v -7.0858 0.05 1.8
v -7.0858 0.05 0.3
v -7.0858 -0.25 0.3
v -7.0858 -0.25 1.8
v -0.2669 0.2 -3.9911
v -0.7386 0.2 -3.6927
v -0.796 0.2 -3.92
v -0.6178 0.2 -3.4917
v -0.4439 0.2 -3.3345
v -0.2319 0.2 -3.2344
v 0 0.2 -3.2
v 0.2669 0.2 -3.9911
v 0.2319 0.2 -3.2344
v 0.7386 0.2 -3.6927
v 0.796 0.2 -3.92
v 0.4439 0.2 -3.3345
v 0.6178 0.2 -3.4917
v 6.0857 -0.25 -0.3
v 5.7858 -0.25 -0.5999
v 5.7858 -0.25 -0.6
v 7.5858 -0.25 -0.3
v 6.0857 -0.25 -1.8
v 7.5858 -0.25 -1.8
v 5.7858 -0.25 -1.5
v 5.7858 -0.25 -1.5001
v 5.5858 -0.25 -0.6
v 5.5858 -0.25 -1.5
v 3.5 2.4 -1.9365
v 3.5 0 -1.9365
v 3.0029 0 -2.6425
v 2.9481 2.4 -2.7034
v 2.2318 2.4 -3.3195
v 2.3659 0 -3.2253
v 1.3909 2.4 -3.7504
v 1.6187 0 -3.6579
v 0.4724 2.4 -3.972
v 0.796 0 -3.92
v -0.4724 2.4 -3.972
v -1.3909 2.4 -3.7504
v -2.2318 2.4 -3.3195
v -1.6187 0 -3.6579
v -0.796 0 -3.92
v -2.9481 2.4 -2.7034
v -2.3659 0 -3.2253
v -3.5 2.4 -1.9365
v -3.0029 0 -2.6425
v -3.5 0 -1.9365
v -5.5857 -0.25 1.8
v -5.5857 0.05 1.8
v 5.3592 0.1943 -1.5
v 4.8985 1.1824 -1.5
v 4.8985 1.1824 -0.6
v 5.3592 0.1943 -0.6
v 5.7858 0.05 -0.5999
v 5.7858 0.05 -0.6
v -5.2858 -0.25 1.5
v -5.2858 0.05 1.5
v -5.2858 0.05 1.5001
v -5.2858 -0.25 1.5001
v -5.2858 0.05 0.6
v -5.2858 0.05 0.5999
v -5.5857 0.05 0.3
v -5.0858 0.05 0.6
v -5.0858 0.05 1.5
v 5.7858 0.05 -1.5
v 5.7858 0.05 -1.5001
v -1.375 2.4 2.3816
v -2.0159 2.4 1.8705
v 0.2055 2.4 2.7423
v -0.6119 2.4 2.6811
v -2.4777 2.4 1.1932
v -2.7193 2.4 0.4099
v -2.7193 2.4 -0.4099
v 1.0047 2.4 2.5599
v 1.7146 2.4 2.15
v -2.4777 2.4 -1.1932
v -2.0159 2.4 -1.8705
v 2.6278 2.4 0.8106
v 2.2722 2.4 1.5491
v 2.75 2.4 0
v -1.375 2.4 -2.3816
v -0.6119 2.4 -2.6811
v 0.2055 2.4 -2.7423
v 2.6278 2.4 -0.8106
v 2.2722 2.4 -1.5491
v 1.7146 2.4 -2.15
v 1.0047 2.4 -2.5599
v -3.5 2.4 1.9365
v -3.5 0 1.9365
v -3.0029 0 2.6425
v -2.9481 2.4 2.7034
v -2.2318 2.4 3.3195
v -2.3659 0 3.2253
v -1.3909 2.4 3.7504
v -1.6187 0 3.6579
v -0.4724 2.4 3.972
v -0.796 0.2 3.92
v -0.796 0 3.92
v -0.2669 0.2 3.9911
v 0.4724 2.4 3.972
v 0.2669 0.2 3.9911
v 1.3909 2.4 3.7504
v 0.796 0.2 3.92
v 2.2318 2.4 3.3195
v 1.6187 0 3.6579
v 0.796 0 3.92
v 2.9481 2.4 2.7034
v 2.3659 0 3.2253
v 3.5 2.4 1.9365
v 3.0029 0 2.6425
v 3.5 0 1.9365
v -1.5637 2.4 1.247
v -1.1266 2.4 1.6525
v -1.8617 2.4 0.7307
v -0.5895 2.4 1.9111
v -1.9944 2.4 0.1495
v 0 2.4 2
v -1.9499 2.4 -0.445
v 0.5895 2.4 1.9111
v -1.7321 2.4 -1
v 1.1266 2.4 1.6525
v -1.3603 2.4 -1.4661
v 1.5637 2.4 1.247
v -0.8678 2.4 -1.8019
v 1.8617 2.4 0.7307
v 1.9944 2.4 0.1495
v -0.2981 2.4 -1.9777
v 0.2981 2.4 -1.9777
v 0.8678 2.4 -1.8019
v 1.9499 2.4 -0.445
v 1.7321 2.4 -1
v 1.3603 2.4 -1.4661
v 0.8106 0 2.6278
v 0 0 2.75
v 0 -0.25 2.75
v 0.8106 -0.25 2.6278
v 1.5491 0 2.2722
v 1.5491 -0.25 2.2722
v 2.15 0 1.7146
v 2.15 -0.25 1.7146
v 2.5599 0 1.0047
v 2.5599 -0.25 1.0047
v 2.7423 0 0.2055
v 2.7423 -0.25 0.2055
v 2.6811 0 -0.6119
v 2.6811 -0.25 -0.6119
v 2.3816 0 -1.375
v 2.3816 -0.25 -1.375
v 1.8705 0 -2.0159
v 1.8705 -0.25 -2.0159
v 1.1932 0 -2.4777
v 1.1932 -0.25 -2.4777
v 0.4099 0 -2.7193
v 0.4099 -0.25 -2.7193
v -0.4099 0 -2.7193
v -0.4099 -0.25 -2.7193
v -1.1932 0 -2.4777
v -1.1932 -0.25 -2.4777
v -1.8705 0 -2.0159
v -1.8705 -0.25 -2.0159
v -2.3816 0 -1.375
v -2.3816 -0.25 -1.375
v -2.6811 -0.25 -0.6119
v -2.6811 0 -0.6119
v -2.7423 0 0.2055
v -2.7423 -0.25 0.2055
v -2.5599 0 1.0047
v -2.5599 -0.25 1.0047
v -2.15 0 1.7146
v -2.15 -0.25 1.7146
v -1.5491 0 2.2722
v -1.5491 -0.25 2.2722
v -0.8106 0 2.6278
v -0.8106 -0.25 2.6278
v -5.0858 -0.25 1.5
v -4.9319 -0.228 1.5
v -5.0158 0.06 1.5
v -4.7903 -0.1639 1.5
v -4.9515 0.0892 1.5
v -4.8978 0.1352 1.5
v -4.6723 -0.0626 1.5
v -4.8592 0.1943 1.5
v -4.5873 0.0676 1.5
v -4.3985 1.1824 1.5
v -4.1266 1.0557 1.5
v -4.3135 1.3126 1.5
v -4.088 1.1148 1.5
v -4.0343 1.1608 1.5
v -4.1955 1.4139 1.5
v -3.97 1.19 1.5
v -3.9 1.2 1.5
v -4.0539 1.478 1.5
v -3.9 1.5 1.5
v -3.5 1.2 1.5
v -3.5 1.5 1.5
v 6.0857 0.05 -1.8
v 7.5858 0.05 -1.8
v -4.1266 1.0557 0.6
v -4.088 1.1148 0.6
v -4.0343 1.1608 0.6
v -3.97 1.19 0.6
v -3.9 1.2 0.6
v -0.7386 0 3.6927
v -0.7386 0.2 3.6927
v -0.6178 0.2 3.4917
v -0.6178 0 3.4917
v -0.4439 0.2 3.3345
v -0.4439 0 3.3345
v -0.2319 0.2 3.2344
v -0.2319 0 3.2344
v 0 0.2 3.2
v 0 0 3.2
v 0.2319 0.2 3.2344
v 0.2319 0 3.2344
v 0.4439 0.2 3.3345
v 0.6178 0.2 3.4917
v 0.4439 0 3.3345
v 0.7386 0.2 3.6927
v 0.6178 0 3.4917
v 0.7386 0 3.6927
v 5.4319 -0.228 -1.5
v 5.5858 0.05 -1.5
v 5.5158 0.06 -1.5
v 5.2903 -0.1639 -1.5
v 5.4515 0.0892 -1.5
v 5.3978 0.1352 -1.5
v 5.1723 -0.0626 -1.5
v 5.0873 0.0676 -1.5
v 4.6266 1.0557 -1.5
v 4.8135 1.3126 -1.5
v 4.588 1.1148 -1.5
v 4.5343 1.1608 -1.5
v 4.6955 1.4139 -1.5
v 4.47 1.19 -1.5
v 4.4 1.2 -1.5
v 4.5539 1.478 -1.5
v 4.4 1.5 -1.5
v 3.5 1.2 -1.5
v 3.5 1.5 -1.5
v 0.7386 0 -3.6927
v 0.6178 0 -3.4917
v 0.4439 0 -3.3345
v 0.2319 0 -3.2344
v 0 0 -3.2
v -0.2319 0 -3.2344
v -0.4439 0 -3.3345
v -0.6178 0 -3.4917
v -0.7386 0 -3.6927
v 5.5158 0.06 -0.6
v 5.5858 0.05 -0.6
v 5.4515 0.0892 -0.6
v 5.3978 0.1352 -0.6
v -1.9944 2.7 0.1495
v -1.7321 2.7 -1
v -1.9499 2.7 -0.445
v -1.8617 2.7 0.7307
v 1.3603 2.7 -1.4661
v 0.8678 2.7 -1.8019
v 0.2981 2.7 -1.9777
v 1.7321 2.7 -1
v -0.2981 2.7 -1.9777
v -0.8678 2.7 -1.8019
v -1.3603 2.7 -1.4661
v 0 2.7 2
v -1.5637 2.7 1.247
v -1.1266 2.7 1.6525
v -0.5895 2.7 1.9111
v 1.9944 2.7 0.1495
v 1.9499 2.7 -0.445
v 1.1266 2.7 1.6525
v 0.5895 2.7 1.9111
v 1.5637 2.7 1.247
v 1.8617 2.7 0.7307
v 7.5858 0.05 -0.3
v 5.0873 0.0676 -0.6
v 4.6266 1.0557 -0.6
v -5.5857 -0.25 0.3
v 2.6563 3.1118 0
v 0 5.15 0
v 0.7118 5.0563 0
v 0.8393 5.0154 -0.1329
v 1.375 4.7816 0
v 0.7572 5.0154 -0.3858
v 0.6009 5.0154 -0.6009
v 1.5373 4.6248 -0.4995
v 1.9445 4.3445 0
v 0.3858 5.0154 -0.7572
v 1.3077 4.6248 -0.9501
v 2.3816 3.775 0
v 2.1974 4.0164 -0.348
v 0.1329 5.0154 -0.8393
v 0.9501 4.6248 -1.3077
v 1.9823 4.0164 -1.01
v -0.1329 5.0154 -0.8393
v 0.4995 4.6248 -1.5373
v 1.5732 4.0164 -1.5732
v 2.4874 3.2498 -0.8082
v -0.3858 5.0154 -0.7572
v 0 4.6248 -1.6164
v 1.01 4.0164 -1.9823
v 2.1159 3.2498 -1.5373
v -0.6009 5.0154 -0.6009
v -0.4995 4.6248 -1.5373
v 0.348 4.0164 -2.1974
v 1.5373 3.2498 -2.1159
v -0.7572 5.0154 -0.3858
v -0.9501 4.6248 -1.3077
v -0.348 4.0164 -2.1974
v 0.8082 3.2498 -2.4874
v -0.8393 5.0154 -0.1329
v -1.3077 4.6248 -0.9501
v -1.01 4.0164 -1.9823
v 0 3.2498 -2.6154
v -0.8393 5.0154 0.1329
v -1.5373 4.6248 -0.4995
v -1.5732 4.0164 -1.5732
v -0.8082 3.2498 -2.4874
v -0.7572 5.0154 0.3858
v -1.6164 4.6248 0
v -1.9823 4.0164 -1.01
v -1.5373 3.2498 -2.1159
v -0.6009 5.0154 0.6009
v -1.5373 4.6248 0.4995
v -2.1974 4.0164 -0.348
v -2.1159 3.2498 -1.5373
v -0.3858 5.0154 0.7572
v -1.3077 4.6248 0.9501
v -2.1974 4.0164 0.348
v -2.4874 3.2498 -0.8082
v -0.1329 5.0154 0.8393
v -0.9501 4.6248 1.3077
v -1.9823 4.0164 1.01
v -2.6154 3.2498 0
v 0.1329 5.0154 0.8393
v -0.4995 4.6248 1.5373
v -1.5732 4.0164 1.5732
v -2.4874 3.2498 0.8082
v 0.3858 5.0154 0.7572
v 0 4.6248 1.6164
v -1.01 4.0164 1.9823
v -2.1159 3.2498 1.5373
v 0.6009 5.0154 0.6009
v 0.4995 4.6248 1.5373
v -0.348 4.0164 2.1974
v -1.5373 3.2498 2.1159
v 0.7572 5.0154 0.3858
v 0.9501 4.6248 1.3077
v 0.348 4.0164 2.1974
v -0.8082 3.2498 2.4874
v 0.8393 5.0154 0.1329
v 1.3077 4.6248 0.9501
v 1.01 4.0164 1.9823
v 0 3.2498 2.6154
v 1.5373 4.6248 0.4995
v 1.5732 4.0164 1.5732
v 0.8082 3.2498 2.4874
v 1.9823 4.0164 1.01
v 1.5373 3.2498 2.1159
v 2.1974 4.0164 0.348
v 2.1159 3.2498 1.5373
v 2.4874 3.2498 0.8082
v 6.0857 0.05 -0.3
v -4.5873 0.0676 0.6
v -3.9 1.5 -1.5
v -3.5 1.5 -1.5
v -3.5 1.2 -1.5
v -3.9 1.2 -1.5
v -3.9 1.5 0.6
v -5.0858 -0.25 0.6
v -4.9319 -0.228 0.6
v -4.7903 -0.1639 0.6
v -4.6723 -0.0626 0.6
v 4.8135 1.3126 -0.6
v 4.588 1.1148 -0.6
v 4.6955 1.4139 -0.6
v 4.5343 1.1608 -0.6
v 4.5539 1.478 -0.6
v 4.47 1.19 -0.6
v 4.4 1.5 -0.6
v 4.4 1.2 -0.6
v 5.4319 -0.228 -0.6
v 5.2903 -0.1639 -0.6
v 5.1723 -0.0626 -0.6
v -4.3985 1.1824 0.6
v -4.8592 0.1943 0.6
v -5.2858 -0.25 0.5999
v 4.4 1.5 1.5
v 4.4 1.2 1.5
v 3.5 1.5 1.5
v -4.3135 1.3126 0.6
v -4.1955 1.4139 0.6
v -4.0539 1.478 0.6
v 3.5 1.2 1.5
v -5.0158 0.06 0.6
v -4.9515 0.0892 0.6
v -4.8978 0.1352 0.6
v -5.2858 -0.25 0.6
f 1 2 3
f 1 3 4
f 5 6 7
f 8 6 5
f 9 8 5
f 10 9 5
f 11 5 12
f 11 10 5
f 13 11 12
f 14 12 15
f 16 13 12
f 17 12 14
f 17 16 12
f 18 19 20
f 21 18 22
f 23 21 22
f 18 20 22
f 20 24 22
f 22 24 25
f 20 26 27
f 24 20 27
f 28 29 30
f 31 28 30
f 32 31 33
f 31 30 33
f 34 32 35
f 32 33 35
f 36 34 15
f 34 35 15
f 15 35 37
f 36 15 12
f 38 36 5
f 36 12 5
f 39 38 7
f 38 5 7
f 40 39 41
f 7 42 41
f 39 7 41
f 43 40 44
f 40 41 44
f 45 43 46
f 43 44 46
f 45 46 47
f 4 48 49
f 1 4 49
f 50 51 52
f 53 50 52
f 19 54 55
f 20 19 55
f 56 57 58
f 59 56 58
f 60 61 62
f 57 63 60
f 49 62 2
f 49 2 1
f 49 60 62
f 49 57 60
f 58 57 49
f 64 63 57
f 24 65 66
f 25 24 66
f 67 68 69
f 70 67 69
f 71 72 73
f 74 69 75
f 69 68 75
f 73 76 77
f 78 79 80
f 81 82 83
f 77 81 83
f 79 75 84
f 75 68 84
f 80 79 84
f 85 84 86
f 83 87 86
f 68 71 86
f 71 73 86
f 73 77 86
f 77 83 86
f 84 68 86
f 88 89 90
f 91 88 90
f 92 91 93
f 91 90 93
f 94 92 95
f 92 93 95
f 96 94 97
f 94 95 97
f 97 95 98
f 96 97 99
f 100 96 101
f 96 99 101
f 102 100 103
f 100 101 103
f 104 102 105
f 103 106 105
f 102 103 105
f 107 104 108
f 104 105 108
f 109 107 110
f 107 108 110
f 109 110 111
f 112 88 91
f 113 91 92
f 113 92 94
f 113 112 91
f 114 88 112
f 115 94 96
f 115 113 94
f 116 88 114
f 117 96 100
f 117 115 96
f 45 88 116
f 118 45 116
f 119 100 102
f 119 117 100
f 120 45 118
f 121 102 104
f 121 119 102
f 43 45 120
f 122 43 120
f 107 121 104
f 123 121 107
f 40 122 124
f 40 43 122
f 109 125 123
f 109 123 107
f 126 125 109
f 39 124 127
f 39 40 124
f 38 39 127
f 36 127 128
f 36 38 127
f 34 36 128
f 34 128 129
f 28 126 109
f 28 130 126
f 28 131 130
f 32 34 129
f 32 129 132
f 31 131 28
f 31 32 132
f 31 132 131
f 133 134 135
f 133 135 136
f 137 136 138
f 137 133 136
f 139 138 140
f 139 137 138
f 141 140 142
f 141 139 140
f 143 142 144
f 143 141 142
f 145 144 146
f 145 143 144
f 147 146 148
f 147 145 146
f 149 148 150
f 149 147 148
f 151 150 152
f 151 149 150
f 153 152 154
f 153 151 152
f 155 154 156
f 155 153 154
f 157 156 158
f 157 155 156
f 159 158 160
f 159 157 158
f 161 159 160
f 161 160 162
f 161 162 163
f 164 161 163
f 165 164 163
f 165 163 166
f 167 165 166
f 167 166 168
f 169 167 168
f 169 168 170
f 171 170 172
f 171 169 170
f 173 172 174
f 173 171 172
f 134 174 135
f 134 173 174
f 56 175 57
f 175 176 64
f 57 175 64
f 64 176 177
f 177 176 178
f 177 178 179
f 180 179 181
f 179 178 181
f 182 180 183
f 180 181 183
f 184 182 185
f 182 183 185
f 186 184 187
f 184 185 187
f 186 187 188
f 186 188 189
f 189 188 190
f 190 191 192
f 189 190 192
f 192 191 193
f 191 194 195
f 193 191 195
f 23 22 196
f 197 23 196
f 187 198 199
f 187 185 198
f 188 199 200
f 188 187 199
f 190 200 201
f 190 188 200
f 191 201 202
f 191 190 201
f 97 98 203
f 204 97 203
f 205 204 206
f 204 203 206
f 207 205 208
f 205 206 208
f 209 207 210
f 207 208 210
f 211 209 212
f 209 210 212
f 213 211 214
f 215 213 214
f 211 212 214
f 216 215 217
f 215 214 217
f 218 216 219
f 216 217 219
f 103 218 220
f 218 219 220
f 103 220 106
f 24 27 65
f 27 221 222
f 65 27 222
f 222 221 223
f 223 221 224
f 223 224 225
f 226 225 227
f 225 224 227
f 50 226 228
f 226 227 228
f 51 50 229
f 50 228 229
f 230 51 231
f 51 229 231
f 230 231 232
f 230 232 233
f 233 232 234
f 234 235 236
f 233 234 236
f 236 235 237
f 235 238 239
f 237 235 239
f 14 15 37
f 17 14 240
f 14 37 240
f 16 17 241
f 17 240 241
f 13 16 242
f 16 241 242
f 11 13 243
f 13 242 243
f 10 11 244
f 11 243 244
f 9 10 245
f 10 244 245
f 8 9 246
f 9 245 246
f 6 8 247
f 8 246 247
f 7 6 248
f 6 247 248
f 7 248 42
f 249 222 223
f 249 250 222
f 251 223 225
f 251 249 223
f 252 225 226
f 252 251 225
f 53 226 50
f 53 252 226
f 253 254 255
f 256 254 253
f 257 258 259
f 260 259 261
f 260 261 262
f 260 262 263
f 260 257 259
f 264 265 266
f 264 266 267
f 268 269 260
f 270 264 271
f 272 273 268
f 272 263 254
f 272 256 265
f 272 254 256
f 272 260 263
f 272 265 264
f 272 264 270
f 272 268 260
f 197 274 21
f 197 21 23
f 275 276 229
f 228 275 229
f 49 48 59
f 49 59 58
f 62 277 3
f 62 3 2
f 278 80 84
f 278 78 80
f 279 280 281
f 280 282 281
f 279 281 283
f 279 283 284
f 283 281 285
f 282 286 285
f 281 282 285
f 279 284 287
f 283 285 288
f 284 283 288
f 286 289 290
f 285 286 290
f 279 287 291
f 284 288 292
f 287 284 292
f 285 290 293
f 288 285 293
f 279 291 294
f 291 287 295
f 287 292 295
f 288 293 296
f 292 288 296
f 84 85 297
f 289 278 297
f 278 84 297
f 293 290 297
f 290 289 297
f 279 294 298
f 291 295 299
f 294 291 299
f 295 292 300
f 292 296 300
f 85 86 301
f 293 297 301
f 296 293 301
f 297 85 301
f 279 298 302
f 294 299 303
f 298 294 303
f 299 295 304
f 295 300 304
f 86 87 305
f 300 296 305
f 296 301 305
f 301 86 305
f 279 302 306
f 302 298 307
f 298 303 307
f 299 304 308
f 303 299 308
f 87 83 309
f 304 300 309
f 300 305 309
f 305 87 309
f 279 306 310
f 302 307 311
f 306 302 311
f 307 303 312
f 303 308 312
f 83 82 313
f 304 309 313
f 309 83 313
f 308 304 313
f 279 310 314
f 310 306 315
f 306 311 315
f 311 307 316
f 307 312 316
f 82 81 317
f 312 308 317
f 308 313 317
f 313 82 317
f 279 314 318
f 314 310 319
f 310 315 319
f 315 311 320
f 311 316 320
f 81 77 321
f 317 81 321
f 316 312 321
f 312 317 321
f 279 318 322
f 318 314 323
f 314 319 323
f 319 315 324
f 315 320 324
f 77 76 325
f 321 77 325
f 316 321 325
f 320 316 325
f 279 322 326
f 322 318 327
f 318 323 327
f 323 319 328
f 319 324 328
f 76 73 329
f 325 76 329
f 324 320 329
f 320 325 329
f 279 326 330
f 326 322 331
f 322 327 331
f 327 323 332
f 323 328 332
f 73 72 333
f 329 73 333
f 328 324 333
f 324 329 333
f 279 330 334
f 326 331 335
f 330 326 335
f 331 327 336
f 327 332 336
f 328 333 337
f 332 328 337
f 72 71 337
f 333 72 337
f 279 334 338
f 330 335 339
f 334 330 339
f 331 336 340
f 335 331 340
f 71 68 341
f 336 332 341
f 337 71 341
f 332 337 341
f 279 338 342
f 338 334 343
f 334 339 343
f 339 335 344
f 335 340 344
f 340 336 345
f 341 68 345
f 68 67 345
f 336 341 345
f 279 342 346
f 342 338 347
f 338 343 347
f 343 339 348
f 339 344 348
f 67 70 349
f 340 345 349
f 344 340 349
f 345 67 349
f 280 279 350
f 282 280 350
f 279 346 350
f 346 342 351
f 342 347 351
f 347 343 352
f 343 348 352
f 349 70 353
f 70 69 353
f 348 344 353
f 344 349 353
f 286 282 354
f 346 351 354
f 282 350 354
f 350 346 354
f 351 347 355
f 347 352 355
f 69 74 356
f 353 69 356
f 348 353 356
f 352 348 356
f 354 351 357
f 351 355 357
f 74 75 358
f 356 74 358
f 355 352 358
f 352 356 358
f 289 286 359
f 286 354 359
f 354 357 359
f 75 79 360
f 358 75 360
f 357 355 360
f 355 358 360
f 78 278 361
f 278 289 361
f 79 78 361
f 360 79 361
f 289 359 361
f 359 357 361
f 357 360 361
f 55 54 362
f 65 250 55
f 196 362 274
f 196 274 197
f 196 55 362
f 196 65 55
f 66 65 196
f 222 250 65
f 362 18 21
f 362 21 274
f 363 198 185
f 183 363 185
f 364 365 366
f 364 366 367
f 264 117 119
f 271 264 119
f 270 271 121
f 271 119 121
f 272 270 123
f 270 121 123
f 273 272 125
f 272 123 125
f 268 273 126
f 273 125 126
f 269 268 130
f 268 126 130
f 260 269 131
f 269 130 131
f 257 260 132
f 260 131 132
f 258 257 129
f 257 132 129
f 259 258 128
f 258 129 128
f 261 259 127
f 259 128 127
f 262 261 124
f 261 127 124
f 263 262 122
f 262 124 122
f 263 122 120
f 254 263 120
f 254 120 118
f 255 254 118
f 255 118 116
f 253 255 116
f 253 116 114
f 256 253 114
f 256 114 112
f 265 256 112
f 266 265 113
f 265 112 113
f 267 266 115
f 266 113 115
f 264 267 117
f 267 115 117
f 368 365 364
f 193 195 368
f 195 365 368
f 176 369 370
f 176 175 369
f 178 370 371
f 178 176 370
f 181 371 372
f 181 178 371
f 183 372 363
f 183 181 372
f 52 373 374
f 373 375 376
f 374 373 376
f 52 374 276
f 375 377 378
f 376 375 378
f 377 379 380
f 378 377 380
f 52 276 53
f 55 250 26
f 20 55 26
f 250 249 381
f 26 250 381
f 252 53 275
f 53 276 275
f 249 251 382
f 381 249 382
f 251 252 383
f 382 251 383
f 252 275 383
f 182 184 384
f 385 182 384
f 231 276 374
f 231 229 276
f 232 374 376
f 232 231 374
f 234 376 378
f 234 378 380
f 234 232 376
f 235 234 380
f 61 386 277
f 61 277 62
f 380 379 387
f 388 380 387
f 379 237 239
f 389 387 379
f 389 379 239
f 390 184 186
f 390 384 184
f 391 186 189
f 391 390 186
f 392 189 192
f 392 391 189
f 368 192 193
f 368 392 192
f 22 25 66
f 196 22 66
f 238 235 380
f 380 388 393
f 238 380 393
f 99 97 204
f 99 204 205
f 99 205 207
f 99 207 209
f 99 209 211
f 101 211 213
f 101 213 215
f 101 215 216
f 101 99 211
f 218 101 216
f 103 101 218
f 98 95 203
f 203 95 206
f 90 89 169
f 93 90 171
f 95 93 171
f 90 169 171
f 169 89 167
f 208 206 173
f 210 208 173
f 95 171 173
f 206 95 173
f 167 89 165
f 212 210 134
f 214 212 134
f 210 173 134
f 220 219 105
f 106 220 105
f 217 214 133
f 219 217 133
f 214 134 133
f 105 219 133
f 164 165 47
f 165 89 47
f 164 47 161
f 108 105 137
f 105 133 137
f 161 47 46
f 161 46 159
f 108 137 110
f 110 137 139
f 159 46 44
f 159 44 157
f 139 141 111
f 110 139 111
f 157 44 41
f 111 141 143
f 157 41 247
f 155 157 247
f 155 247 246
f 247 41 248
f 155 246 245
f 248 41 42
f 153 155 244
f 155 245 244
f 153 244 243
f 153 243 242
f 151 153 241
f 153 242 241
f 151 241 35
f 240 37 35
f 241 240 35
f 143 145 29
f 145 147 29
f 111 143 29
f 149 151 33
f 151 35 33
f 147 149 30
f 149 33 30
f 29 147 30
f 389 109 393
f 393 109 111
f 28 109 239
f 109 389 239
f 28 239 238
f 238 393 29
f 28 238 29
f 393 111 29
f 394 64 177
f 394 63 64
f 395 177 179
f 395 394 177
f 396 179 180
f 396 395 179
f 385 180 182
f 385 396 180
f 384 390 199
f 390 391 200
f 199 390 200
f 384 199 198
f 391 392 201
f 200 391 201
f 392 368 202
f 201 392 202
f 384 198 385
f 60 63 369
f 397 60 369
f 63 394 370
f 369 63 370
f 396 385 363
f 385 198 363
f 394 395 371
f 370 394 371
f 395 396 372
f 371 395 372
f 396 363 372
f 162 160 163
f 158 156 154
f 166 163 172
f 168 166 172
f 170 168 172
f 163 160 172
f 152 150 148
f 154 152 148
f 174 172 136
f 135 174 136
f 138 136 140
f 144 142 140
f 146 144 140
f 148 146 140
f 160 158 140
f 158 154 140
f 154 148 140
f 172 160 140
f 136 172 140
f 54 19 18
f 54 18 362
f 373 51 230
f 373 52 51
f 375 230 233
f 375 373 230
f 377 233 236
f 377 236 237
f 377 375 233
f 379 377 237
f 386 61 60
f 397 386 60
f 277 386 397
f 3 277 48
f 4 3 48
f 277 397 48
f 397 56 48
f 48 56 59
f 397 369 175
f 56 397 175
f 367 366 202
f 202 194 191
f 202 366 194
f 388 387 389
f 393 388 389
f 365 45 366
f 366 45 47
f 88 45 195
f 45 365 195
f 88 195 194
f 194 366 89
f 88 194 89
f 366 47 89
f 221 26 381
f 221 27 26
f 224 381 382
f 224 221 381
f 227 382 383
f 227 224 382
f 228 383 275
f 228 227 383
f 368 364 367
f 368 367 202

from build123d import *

# Parameters (mm, degrees)
BOSS_EXTRUDE1_DEPTH = 2.4
SKETCH2_R           = 2.75
BOSS_EXTRUDE2_DEPTH = 0.25
SKETCH3_R           = 2
BOSS_EXTRUDE3_DEPTH = 0.3
SKETCH5_W           = 8.3
SKETCH5_H           = 3
BOSS_EXTRUDE4_DEPTH = 0.15
SKETCH6_W           = 0.9
SKETCH6_H           = 0.3
SKETCH8_W           = 0.9
SKETCH8_H           = 0.3
SKETCH10_W          = 1.5
SKETCH10_H          = 0.3
BOSS_EXTRUDE5_DEPTH = 1.8
SKETCH11_W          = 1.5
SKETCH11_H          = 0.3
BOSS_EXTRUDE6_DEPTH = 1.8
CHAMFER1_SIZE       = 0.3
SKETCH12_R          = 0.8
CUT_EXTRUDE1_DEPTH  = 0.2


with BuildPart() as part:
    # Sketch1 → Boss-Extrude1 (new body)
    with BuildSketch(Plane(origin=(0, 0, 0), x_dir=(1, 0, 0), z_dir=(0, 1, 0))):
        with BuildLine():
            Line((-3.5, 1.936491673), (-3.5, -1.936491673))
            ThreePointArc((-3.5, -1.936491673), (0, -4), (3.5, -1.936491673))
            Line((3.5, -1.936491673), (3.5, 1.936491673))
            ThreePointArc((3.5, 1.936491673), (0, 4), (-3.5, 1.936491673))
        make_face()
    extrude(amount=BOSS_EXTRUDE1_DEPTH)

    # Sketch2 → Boss-Extrude2 (add)
    with BuildSketch(Plane(origin=(0, 0, 0), x_dir=(1, 0, 0), z_dir=(0, 1, 0))):
        with Locations(Location((0, 0, 0), (0, 0, 270))):
            Circle(SKETCH2_R)
    extrude(amount=-BOSS_EXTRUDE2_DEPTH)

    # Sketch3 → Boss-Extrude3 (add)
    with BuildSketch(Plane(origin=(0, 2.4, 0), x_dir=(1, 0, 0), z_dir=(0, 1, 0))):
        with Locations(Location((0, 0, 0), (0, 0, 270))):
            Circle(SKETCH3_R)
    extrude(amount=BOSS_EXTRUDE3_DEPTH)

    # Sketch5 → Boss-Extrude4 (add, symmetric)
    with BuildSketch(Plane(origin=(0, 1.35, 0), x_dir=(-1, 0, 0), z_dir=(0, 1, 0))):
        with Locations((-0.25, 0)):
            Rectangle(SKETCH5_W, SKETCH5_H)
    extrude(amount=BOSS_EXTRUDE4_DEPTH, both=True)

    # Sweep2: sweep along a path in Sketch7
    with BuildLine(Plane.XY.offset(-1.05)) as sweep2_path:
        Line((5.785802313, -0.1), (5.585802313, -0.1))
        ThreePointArc((5.585802313, -0.1), (5.37088247, -0.037356578), (5.223279198, 0.130952695))
        Line((5.223279198, 0.130952695), (4.762523115, 1.119047305))
        ThreePointArc((4.762523115, 1.119047305), (4.614919843, 1.287356578), (4.4, 1.35))
    # Sketch6 → Sweep2 (sweep)
    with BuildSketch(Plane(origin=(4.4, 0, 0), x_dir=(0, 0, -1), z_dir=(1, 0, 0))):
        with Locations((1.05, 1.35)):
            Rectangle(SKETCH6_W, SKETCH6_H)
    sweep(path=sweep2_path.line)

    # Sweep3: sweep along a path in Sketch9
    with BuildLine(Plane.XY.offset(1.05)) as sweep3_path:
        Line((-5.285802313, -0.1), (-5.085802313, -0.1))
        ThreePointArc((-5.085802313, -0.1), (-4.87088247, -0.037356578), (-4.723279198, 0.130952695))
        Line((-4.723279198, 0.130952695), (-4.262523115, 1.119047305))
        ThreePointArc((-4.262523115, 1.119047305), (-4.114919843, 1.287356578), (-3.9, 1.35))
    # Sketch8 → Sweep3 (sweep)
    with BuildSketch(Plane.ZY.offset(3.9)):
        with Locations((1.05, 1.35)):
            Rectangle(SKETCH8_W, SKETCH8_H)
    sweep(path=sweep3_path.line)

    # Sketch10 → Boss-Extrude5 (add)
    with BuildSketch(Plane.ZY.offset(5.285802313)):
        with Locations((1.05, -0.1)):
            Rectangle(SKETCH10_W, SKETCH10_H)
    extrude(amount=BOSS_EXTRUDE5_DEPTH)

    # Sketch11 → Boss-Extrude6 (add)
    with BuildSketch(Plane(origin=(5.785802313, 0, 0), x_dir=(0, 0, -1), z_dir=(1, 0, 0))):
        with Locations((1.05, -0.1)):
            Rectangle(SKETCH11_W, SKETCH11_H)
    extrude(amount=BOSS_EXTRUDE6_DEPTH)

    # Chamfer1
    chamfer1_edges = [part.edges().sort_by_distance(p)[0] for p in [
        (5.785802313, -0.1, -0.3),
        (5.785802313, -0.1, -1.8),
        (-5.285802313, -0.1, 0.3),
        (-5.285802313, -0.1, 1.8),
    ]]
    chamfer(chamfer1_edges, length=CHAMFER1_SIZE - 0.0001)  # a hair under: the kernel refuses the full size

    # Sketch12 → Cut-Extrude1 (cut)
    with BuildSketch(Plane.XZ):
        with Locations((0, 4)):
            Circle(SKETCH12_R)
        with Locations((0, -4)):
            Circle(SKETCH12_R)
    extrude(amount=-CUT_EXTRUDE1_DEPTH, mode=Mode.SUBTRACT)


with BuildPart() as body_2:
    # Sketch4 → Revolve1 (revolve)
    with BuildSketch(Plane.XY):
        with BuildLine():
            Line((0, 2.4), (0, 5.15))
            ThreePointArc((0, 5.15), (1.944543648, 4.344543648), (2.75, 2.4))
            Line((2.75, 2.4), (0, 2.4))
        make_face()
    revolve(axis=Axis((0, 2.4, 0), (0, 1, 0)))


solid = Compound([part.part, body_2.part])
